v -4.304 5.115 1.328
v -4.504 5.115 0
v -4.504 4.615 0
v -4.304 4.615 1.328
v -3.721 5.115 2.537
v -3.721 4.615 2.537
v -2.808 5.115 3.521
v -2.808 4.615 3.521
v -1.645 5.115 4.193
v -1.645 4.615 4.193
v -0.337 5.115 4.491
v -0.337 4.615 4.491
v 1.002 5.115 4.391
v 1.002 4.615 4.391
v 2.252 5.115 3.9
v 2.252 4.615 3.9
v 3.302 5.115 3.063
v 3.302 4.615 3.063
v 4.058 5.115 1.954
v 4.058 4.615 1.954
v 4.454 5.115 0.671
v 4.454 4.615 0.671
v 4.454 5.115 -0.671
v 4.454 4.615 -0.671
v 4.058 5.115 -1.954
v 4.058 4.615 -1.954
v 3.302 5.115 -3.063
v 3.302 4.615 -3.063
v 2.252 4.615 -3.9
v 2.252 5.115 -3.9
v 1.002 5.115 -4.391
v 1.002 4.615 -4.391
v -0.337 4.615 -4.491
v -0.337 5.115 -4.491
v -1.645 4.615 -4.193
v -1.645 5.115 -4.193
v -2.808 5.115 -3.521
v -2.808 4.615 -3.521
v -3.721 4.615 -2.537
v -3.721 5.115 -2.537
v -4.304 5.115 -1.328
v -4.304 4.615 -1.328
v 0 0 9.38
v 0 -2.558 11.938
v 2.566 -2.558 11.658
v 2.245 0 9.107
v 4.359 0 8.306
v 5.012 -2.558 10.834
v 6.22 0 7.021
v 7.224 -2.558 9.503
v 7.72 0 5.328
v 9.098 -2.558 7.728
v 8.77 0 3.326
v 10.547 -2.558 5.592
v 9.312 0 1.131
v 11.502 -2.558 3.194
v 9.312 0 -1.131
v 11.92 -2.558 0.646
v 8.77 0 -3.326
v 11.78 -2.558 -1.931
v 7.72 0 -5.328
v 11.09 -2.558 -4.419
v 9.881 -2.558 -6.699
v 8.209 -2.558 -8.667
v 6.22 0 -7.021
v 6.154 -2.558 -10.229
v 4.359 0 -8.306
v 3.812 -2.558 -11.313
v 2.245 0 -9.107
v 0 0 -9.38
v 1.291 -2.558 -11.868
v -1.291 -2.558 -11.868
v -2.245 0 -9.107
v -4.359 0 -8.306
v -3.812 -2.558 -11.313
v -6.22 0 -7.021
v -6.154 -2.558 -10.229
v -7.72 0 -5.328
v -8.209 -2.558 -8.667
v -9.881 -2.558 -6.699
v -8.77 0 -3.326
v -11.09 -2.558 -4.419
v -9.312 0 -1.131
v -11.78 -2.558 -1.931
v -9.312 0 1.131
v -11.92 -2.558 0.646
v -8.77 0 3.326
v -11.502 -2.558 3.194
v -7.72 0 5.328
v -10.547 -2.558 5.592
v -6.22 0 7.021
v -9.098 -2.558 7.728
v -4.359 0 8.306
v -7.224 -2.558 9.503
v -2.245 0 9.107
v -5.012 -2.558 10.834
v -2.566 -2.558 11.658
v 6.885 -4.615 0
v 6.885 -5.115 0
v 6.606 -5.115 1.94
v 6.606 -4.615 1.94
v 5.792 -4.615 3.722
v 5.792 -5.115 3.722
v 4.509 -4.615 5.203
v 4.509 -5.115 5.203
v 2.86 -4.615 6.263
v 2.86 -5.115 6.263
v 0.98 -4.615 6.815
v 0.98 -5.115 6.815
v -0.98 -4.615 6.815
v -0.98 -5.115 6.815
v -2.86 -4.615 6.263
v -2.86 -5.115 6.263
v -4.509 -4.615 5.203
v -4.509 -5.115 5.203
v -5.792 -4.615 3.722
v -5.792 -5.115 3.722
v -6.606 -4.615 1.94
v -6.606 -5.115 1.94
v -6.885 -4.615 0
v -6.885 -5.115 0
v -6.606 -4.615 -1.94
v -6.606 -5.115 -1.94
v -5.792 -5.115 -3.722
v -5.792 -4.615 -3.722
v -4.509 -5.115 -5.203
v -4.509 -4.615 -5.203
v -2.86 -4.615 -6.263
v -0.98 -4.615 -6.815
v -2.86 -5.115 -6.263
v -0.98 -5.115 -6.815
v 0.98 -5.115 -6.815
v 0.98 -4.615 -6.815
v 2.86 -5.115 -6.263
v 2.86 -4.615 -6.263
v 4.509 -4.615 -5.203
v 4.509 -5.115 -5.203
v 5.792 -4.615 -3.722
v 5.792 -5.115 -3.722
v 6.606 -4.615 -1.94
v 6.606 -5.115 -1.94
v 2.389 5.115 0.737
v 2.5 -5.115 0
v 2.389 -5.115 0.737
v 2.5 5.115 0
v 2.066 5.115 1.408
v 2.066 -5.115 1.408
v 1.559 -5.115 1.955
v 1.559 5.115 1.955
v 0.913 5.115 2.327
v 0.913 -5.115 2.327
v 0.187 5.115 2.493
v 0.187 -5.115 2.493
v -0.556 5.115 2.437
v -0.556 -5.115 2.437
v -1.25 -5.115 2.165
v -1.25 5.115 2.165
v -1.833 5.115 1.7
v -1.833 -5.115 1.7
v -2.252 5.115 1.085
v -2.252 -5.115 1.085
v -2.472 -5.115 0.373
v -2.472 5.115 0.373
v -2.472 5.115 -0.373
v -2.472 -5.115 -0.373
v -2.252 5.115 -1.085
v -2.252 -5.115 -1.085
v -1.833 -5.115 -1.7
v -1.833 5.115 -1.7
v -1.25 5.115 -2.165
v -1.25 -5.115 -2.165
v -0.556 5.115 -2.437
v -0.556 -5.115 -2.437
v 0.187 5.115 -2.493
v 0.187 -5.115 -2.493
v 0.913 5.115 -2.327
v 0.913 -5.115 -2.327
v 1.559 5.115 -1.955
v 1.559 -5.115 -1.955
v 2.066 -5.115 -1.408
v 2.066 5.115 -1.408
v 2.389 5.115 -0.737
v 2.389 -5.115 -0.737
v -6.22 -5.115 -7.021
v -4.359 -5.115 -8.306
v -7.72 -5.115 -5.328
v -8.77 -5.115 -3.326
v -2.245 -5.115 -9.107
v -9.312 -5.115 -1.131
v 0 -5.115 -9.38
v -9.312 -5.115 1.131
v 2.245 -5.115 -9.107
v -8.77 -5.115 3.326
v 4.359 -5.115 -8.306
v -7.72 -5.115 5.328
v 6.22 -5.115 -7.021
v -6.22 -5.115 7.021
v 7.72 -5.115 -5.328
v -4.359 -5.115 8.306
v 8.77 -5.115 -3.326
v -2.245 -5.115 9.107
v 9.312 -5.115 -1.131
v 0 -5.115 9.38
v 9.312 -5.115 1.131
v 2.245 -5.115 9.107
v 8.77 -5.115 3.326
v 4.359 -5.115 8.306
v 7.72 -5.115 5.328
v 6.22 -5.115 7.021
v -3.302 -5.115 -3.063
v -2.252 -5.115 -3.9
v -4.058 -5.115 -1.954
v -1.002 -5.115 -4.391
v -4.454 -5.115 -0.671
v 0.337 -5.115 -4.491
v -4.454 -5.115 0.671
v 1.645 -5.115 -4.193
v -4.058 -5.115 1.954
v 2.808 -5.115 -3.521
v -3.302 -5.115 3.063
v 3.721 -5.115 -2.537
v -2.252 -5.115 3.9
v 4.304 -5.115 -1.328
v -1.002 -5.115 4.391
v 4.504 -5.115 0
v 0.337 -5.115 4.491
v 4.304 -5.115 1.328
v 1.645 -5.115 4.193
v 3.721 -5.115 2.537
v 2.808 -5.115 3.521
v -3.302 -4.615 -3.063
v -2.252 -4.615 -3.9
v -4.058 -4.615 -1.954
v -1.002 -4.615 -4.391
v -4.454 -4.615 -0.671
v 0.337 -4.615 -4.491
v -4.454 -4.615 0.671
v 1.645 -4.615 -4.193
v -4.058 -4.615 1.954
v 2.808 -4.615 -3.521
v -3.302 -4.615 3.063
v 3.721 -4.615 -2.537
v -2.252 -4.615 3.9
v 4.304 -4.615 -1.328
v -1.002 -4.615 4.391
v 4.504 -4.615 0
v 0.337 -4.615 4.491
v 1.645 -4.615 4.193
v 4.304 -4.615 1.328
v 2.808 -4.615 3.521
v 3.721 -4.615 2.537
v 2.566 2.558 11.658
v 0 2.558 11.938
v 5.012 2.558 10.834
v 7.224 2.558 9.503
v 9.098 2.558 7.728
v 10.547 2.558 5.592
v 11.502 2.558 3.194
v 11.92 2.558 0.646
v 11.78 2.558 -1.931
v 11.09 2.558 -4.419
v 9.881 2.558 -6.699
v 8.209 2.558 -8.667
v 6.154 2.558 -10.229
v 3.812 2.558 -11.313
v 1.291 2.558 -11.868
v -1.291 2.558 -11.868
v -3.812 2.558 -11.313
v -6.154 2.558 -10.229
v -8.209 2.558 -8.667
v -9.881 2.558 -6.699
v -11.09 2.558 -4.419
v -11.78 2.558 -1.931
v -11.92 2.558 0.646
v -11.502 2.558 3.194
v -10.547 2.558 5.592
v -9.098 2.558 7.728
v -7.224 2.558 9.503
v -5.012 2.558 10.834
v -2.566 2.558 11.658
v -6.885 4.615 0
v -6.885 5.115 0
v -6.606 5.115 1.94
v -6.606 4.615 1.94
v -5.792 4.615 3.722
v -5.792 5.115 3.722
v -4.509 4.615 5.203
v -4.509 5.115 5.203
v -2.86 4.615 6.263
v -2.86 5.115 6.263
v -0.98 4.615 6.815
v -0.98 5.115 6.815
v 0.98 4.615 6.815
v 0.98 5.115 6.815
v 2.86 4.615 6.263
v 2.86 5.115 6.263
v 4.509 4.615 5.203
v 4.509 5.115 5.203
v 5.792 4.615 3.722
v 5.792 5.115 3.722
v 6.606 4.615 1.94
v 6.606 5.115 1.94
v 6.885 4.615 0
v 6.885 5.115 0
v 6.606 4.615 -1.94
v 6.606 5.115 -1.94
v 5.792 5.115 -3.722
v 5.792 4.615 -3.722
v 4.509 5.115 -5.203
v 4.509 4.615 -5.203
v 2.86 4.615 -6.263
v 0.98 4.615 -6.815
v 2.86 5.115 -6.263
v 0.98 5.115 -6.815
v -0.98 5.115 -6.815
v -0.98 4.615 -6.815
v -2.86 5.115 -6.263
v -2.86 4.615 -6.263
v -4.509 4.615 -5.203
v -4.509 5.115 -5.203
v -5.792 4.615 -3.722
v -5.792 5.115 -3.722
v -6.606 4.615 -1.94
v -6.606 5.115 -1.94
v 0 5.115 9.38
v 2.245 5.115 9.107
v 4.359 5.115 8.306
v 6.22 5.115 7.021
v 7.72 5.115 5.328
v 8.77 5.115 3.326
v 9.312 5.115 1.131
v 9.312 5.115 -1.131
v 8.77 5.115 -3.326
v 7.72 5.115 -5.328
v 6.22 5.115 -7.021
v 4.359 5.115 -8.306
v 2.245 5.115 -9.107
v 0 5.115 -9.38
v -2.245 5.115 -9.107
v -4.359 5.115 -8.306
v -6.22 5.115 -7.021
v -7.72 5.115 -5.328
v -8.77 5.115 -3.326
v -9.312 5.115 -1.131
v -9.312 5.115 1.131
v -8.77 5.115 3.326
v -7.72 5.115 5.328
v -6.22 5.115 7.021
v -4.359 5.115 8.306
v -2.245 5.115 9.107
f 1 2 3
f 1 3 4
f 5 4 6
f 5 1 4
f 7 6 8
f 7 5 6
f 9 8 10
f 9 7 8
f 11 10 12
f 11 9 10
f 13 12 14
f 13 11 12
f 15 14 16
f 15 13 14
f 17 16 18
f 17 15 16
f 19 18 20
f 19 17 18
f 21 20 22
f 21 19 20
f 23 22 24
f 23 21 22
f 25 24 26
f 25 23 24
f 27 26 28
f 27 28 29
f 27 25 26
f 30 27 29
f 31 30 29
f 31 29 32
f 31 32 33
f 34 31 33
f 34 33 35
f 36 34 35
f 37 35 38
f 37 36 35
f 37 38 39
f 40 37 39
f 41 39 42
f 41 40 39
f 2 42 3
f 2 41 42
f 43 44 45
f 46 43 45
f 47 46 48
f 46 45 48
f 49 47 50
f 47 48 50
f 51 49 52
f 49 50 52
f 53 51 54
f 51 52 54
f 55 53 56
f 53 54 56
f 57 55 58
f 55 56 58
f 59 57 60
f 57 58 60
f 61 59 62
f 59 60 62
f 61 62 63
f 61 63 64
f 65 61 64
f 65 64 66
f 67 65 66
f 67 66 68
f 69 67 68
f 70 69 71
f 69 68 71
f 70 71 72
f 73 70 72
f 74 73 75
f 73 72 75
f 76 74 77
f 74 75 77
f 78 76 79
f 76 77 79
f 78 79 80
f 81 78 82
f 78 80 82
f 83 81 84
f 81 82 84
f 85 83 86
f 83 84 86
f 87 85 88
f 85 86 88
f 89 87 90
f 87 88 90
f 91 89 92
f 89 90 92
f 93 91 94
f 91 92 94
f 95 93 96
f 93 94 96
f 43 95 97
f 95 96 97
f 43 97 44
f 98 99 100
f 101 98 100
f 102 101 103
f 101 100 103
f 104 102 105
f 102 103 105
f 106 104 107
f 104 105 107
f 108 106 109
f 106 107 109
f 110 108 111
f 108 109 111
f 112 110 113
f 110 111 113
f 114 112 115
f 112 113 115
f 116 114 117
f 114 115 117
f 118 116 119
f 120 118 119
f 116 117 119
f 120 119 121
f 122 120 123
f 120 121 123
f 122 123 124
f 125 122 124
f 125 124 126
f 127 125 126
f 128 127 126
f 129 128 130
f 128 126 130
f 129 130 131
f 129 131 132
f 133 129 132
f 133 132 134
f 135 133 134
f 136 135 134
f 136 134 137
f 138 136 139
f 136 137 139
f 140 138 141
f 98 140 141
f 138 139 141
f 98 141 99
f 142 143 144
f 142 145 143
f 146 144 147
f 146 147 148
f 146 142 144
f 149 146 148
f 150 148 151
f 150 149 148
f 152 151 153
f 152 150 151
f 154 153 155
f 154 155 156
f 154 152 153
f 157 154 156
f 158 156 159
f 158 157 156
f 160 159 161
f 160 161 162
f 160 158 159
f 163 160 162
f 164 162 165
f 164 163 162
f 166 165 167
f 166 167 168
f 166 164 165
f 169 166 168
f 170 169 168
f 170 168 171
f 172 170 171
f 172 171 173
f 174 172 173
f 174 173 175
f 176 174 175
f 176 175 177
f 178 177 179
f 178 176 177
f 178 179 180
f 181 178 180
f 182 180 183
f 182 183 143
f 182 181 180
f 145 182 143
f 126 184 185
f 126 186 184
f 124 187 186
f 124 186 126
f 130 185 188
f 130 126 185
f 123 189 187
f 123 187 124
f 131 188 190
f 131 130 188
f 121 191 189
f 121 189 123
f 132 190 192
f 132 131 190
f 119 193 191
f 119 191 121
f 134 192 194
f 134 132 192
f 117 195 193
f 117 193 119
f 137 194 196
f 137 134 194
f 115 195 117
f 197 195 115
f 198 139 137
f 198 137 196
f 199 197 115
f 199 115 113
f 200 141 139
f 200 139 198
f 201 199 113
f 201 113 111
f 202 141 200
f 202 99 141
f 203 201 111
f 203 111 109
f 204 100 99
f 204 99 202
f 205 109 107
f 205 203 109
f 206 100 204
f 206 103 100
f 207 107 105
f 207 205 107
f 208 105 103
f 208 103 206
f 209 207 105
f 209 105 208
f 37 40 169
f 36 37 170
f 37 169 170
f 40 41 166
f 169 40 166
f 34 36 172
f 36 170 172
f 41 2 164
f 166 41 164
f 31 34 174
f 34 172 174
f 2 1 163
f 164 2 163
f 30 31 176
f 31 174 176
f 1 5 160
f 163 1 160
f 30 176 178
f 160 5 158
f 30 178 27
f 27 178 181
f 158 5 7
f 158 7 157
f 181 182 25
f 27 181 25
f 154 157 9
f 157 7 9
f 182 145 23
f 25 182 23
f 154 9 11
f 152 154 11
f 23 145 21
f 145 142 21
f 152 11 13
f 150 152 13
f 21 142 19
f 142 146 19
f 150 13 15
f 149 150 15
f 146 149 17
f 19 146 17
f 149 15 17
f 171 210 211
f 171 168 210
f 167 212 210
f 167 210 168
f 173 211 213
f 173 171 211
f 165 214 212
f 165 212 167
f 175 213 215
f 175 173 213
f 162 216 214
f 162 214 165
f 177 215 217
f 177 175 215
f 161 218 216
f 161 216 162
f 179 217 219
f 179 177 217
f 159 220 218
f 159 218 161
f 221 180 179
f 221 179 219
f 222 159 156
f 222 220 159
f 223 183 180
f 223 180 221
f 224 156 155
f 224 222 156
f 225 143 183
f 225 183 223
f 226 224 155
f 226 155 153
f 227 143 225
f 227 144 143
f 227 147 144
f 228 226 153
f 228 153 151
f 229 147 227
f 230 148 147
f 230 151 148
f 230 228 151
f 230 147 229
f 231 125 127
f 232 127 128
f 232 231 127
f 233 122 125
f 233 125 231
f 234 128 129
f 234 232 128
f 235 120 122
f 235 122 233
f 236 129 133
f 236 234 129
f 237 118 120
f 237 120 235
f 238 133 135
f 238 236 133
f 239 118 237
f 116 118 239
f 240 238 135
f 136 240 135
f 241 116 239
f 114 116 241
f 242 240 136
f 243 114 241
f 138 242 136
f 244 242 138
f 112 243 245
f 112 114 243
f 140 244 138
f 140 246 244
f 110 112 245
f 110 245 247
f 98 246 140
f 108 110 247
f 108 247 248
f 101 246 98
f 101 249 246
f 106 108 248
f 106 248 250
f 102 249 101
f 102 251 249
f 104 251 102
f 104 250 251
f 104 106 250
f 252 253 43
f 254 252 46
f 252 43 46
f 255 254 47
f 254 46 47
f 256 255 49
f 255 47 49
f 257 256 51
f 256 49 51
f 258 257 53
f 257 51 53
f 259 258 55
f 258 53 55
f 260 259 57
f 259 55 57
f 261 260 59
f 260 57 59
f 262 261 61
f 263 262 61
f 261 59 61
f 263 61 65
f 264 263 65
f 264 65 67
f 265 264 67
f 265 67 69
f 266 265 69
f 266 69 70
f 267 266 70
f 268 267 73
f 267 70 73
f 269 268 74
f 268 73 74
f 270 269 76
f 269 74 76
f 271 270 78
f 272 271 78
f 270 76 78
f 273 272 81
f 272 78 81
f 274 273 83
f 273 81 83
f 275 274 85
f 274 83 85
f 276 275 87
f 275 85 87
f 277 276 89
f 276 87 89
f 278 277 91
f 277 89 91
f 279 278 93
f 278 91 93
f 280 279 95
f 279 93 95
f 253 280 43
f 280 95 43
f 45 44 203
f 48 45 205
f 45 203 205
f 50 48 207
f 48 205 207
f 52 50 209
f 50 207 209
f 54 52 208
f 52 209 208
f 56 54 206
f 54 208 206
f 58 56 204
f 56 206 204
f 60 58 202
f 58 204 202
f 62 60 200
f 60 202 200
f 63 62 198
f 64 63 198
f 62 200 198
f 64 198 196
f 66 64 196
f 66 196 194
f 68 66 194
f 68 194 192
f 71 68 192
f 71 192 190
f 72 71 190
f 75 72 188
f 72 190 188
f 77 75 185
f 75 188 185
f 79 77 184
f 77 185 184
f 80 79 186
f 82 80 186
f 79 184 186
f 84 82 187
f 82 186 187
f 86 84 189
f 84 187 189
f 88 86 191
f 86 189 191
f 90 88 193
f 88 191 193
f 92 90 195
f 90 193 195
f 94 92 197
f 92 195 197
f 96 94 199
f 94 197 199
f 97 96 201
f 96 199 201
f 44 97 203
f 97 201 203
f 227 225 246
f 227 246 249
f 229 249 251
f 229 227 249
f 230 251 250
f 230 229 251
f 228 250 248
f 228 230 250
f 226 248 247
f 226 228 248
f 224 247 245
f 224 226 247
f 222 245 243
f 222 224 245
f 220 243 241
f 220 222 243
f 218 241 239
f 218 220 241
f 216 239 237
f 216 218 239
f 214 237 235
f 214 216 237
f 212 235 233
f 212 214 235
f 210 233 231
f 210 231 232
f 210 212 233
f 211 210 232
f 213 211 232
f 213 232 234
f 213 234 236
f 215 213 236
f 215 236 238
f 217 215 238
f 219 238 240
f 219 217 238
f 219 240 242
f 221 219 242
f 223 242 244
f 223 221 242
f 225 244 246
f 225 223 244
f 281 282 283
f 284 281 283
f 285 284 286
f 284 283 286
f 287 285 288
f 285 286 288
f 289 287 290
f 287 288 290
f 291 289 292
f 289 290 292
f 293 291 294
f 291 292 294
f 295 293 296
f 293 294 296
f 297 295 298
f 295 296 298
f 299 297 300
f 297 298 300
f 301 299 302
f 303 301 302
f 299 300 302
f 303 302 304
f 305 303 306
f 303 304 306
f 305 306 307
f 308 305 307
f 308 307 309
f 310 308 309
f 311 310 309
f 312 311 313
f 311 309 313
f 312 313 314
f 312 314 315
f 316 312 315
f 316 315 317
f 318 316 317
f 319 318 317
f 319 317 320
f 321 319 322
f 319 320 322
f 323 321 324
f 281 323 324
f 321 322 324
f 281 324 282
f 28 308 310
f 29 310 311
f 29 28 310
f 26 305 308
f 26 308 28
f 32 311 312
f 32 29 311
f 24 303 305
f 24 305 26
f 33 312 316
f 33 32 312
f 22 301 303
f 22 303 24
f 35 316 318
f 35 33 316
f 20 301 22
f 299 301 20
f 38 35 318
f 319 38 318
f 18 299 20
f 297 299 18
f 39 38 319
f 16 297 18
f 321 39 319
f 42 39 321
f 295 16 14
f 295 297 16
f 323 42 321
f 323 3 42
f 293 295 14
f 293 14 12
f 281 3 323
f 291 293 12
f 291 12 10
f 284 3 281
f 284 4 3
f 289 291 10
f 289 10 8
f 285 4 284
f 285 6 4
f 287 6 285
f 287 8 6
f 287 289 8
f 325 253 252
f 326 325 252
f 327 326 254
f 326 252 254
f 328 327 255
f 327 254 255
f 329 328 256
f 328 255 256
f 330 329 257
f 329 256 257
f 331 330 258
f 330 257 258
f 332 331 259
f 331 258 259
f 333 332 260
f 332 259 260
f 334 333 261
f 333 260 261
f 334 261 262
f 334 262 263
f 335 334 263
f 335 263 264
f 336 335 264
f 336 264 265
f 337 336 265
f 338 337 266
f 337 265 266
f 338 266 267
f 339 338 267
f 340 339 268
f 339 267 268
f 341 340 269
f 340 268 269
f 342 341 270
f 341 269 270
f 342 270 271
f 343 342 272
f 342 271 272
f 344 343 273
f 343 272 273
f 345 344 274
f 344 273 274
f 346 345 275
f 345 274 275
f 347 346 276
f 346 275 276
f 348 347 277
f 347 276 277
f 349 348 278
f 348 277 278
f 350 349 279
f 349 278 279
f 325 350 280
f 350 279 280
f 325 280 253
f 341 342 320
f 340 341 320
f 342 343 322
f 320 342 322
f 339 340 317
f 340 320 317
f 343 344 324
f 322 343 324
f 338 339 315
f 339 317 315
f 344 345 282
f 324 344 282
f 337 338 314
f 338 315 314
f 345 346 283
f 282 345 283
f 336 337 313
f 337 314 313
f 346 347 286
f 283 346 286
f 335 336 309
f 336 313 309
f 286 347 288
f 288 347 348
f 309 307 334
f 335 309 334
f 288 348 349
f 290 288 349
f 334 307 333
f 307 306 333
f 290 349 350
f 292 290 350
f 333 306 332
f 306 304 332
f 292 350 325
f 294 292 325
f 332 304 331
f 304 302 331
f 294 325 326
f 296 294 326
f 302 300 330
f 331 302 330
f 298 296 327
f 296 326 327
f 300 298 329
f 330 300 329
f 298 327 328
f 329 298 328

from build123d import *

# Parameters (mm, degrees)
F0_R     = 9.38
F0_R_2   = 2.5
F1_DEPTH = 5.115
F4_R     = 6.884933
F4_R_2   = 4.503868
F5_DEPTH = 0.5
F6_R     = 6.884933
F6_R_2   = 4.503868
F7_DEPTH = 0.5


with BuildPart() as f1:
    # F0 (on Front) → F1 (new body, symmetric)
    with BuildSketch(Plane.XZ):
        Circle(F0_R)
        Circle(F0_R_2, mode=Mode.SUBTRACT)
    extrude(amount=F1_DEPTH, both=True)

    # F2 (on Right) → F3 (revolve)
    with BuildSketch(Plane.YZ):
        Polygon((-5.115, 9.38), (0, 9.38), (-2.5575, 11.9375), align=None)
        Polygon((2.5575, 11.9375), (0, 9.38), (5.115, 9.38), align=None)
    revolve(axis=Axis((0, 0, 0), (0, 1, 0)))

    # F4 (on face) → F5 (cut)
    with BuildSketch(Plane(origin=(0, 5.115, 0), x_dir=(-1, 0, 0), z_dir=(0, 1, 0))):
        Circle(F4_R)
        Circle(F4_R_2, mode=Mode.SUBTRACT)
    extrude(amount=-F5_DEPTH, mode=Mode.SUBTRACT)

    # F6 (on face) → F7 (cut)
    with BuildSketch(Plane.XZ.offset(5.115)):
        Circle(F6_R)
        Circle(F6_R_2, mode=Mode.SUBTRACT)
    extrude(amount=-F7_DEPTH, mode=Mode.SUBTRACT)


solid = f1.part
